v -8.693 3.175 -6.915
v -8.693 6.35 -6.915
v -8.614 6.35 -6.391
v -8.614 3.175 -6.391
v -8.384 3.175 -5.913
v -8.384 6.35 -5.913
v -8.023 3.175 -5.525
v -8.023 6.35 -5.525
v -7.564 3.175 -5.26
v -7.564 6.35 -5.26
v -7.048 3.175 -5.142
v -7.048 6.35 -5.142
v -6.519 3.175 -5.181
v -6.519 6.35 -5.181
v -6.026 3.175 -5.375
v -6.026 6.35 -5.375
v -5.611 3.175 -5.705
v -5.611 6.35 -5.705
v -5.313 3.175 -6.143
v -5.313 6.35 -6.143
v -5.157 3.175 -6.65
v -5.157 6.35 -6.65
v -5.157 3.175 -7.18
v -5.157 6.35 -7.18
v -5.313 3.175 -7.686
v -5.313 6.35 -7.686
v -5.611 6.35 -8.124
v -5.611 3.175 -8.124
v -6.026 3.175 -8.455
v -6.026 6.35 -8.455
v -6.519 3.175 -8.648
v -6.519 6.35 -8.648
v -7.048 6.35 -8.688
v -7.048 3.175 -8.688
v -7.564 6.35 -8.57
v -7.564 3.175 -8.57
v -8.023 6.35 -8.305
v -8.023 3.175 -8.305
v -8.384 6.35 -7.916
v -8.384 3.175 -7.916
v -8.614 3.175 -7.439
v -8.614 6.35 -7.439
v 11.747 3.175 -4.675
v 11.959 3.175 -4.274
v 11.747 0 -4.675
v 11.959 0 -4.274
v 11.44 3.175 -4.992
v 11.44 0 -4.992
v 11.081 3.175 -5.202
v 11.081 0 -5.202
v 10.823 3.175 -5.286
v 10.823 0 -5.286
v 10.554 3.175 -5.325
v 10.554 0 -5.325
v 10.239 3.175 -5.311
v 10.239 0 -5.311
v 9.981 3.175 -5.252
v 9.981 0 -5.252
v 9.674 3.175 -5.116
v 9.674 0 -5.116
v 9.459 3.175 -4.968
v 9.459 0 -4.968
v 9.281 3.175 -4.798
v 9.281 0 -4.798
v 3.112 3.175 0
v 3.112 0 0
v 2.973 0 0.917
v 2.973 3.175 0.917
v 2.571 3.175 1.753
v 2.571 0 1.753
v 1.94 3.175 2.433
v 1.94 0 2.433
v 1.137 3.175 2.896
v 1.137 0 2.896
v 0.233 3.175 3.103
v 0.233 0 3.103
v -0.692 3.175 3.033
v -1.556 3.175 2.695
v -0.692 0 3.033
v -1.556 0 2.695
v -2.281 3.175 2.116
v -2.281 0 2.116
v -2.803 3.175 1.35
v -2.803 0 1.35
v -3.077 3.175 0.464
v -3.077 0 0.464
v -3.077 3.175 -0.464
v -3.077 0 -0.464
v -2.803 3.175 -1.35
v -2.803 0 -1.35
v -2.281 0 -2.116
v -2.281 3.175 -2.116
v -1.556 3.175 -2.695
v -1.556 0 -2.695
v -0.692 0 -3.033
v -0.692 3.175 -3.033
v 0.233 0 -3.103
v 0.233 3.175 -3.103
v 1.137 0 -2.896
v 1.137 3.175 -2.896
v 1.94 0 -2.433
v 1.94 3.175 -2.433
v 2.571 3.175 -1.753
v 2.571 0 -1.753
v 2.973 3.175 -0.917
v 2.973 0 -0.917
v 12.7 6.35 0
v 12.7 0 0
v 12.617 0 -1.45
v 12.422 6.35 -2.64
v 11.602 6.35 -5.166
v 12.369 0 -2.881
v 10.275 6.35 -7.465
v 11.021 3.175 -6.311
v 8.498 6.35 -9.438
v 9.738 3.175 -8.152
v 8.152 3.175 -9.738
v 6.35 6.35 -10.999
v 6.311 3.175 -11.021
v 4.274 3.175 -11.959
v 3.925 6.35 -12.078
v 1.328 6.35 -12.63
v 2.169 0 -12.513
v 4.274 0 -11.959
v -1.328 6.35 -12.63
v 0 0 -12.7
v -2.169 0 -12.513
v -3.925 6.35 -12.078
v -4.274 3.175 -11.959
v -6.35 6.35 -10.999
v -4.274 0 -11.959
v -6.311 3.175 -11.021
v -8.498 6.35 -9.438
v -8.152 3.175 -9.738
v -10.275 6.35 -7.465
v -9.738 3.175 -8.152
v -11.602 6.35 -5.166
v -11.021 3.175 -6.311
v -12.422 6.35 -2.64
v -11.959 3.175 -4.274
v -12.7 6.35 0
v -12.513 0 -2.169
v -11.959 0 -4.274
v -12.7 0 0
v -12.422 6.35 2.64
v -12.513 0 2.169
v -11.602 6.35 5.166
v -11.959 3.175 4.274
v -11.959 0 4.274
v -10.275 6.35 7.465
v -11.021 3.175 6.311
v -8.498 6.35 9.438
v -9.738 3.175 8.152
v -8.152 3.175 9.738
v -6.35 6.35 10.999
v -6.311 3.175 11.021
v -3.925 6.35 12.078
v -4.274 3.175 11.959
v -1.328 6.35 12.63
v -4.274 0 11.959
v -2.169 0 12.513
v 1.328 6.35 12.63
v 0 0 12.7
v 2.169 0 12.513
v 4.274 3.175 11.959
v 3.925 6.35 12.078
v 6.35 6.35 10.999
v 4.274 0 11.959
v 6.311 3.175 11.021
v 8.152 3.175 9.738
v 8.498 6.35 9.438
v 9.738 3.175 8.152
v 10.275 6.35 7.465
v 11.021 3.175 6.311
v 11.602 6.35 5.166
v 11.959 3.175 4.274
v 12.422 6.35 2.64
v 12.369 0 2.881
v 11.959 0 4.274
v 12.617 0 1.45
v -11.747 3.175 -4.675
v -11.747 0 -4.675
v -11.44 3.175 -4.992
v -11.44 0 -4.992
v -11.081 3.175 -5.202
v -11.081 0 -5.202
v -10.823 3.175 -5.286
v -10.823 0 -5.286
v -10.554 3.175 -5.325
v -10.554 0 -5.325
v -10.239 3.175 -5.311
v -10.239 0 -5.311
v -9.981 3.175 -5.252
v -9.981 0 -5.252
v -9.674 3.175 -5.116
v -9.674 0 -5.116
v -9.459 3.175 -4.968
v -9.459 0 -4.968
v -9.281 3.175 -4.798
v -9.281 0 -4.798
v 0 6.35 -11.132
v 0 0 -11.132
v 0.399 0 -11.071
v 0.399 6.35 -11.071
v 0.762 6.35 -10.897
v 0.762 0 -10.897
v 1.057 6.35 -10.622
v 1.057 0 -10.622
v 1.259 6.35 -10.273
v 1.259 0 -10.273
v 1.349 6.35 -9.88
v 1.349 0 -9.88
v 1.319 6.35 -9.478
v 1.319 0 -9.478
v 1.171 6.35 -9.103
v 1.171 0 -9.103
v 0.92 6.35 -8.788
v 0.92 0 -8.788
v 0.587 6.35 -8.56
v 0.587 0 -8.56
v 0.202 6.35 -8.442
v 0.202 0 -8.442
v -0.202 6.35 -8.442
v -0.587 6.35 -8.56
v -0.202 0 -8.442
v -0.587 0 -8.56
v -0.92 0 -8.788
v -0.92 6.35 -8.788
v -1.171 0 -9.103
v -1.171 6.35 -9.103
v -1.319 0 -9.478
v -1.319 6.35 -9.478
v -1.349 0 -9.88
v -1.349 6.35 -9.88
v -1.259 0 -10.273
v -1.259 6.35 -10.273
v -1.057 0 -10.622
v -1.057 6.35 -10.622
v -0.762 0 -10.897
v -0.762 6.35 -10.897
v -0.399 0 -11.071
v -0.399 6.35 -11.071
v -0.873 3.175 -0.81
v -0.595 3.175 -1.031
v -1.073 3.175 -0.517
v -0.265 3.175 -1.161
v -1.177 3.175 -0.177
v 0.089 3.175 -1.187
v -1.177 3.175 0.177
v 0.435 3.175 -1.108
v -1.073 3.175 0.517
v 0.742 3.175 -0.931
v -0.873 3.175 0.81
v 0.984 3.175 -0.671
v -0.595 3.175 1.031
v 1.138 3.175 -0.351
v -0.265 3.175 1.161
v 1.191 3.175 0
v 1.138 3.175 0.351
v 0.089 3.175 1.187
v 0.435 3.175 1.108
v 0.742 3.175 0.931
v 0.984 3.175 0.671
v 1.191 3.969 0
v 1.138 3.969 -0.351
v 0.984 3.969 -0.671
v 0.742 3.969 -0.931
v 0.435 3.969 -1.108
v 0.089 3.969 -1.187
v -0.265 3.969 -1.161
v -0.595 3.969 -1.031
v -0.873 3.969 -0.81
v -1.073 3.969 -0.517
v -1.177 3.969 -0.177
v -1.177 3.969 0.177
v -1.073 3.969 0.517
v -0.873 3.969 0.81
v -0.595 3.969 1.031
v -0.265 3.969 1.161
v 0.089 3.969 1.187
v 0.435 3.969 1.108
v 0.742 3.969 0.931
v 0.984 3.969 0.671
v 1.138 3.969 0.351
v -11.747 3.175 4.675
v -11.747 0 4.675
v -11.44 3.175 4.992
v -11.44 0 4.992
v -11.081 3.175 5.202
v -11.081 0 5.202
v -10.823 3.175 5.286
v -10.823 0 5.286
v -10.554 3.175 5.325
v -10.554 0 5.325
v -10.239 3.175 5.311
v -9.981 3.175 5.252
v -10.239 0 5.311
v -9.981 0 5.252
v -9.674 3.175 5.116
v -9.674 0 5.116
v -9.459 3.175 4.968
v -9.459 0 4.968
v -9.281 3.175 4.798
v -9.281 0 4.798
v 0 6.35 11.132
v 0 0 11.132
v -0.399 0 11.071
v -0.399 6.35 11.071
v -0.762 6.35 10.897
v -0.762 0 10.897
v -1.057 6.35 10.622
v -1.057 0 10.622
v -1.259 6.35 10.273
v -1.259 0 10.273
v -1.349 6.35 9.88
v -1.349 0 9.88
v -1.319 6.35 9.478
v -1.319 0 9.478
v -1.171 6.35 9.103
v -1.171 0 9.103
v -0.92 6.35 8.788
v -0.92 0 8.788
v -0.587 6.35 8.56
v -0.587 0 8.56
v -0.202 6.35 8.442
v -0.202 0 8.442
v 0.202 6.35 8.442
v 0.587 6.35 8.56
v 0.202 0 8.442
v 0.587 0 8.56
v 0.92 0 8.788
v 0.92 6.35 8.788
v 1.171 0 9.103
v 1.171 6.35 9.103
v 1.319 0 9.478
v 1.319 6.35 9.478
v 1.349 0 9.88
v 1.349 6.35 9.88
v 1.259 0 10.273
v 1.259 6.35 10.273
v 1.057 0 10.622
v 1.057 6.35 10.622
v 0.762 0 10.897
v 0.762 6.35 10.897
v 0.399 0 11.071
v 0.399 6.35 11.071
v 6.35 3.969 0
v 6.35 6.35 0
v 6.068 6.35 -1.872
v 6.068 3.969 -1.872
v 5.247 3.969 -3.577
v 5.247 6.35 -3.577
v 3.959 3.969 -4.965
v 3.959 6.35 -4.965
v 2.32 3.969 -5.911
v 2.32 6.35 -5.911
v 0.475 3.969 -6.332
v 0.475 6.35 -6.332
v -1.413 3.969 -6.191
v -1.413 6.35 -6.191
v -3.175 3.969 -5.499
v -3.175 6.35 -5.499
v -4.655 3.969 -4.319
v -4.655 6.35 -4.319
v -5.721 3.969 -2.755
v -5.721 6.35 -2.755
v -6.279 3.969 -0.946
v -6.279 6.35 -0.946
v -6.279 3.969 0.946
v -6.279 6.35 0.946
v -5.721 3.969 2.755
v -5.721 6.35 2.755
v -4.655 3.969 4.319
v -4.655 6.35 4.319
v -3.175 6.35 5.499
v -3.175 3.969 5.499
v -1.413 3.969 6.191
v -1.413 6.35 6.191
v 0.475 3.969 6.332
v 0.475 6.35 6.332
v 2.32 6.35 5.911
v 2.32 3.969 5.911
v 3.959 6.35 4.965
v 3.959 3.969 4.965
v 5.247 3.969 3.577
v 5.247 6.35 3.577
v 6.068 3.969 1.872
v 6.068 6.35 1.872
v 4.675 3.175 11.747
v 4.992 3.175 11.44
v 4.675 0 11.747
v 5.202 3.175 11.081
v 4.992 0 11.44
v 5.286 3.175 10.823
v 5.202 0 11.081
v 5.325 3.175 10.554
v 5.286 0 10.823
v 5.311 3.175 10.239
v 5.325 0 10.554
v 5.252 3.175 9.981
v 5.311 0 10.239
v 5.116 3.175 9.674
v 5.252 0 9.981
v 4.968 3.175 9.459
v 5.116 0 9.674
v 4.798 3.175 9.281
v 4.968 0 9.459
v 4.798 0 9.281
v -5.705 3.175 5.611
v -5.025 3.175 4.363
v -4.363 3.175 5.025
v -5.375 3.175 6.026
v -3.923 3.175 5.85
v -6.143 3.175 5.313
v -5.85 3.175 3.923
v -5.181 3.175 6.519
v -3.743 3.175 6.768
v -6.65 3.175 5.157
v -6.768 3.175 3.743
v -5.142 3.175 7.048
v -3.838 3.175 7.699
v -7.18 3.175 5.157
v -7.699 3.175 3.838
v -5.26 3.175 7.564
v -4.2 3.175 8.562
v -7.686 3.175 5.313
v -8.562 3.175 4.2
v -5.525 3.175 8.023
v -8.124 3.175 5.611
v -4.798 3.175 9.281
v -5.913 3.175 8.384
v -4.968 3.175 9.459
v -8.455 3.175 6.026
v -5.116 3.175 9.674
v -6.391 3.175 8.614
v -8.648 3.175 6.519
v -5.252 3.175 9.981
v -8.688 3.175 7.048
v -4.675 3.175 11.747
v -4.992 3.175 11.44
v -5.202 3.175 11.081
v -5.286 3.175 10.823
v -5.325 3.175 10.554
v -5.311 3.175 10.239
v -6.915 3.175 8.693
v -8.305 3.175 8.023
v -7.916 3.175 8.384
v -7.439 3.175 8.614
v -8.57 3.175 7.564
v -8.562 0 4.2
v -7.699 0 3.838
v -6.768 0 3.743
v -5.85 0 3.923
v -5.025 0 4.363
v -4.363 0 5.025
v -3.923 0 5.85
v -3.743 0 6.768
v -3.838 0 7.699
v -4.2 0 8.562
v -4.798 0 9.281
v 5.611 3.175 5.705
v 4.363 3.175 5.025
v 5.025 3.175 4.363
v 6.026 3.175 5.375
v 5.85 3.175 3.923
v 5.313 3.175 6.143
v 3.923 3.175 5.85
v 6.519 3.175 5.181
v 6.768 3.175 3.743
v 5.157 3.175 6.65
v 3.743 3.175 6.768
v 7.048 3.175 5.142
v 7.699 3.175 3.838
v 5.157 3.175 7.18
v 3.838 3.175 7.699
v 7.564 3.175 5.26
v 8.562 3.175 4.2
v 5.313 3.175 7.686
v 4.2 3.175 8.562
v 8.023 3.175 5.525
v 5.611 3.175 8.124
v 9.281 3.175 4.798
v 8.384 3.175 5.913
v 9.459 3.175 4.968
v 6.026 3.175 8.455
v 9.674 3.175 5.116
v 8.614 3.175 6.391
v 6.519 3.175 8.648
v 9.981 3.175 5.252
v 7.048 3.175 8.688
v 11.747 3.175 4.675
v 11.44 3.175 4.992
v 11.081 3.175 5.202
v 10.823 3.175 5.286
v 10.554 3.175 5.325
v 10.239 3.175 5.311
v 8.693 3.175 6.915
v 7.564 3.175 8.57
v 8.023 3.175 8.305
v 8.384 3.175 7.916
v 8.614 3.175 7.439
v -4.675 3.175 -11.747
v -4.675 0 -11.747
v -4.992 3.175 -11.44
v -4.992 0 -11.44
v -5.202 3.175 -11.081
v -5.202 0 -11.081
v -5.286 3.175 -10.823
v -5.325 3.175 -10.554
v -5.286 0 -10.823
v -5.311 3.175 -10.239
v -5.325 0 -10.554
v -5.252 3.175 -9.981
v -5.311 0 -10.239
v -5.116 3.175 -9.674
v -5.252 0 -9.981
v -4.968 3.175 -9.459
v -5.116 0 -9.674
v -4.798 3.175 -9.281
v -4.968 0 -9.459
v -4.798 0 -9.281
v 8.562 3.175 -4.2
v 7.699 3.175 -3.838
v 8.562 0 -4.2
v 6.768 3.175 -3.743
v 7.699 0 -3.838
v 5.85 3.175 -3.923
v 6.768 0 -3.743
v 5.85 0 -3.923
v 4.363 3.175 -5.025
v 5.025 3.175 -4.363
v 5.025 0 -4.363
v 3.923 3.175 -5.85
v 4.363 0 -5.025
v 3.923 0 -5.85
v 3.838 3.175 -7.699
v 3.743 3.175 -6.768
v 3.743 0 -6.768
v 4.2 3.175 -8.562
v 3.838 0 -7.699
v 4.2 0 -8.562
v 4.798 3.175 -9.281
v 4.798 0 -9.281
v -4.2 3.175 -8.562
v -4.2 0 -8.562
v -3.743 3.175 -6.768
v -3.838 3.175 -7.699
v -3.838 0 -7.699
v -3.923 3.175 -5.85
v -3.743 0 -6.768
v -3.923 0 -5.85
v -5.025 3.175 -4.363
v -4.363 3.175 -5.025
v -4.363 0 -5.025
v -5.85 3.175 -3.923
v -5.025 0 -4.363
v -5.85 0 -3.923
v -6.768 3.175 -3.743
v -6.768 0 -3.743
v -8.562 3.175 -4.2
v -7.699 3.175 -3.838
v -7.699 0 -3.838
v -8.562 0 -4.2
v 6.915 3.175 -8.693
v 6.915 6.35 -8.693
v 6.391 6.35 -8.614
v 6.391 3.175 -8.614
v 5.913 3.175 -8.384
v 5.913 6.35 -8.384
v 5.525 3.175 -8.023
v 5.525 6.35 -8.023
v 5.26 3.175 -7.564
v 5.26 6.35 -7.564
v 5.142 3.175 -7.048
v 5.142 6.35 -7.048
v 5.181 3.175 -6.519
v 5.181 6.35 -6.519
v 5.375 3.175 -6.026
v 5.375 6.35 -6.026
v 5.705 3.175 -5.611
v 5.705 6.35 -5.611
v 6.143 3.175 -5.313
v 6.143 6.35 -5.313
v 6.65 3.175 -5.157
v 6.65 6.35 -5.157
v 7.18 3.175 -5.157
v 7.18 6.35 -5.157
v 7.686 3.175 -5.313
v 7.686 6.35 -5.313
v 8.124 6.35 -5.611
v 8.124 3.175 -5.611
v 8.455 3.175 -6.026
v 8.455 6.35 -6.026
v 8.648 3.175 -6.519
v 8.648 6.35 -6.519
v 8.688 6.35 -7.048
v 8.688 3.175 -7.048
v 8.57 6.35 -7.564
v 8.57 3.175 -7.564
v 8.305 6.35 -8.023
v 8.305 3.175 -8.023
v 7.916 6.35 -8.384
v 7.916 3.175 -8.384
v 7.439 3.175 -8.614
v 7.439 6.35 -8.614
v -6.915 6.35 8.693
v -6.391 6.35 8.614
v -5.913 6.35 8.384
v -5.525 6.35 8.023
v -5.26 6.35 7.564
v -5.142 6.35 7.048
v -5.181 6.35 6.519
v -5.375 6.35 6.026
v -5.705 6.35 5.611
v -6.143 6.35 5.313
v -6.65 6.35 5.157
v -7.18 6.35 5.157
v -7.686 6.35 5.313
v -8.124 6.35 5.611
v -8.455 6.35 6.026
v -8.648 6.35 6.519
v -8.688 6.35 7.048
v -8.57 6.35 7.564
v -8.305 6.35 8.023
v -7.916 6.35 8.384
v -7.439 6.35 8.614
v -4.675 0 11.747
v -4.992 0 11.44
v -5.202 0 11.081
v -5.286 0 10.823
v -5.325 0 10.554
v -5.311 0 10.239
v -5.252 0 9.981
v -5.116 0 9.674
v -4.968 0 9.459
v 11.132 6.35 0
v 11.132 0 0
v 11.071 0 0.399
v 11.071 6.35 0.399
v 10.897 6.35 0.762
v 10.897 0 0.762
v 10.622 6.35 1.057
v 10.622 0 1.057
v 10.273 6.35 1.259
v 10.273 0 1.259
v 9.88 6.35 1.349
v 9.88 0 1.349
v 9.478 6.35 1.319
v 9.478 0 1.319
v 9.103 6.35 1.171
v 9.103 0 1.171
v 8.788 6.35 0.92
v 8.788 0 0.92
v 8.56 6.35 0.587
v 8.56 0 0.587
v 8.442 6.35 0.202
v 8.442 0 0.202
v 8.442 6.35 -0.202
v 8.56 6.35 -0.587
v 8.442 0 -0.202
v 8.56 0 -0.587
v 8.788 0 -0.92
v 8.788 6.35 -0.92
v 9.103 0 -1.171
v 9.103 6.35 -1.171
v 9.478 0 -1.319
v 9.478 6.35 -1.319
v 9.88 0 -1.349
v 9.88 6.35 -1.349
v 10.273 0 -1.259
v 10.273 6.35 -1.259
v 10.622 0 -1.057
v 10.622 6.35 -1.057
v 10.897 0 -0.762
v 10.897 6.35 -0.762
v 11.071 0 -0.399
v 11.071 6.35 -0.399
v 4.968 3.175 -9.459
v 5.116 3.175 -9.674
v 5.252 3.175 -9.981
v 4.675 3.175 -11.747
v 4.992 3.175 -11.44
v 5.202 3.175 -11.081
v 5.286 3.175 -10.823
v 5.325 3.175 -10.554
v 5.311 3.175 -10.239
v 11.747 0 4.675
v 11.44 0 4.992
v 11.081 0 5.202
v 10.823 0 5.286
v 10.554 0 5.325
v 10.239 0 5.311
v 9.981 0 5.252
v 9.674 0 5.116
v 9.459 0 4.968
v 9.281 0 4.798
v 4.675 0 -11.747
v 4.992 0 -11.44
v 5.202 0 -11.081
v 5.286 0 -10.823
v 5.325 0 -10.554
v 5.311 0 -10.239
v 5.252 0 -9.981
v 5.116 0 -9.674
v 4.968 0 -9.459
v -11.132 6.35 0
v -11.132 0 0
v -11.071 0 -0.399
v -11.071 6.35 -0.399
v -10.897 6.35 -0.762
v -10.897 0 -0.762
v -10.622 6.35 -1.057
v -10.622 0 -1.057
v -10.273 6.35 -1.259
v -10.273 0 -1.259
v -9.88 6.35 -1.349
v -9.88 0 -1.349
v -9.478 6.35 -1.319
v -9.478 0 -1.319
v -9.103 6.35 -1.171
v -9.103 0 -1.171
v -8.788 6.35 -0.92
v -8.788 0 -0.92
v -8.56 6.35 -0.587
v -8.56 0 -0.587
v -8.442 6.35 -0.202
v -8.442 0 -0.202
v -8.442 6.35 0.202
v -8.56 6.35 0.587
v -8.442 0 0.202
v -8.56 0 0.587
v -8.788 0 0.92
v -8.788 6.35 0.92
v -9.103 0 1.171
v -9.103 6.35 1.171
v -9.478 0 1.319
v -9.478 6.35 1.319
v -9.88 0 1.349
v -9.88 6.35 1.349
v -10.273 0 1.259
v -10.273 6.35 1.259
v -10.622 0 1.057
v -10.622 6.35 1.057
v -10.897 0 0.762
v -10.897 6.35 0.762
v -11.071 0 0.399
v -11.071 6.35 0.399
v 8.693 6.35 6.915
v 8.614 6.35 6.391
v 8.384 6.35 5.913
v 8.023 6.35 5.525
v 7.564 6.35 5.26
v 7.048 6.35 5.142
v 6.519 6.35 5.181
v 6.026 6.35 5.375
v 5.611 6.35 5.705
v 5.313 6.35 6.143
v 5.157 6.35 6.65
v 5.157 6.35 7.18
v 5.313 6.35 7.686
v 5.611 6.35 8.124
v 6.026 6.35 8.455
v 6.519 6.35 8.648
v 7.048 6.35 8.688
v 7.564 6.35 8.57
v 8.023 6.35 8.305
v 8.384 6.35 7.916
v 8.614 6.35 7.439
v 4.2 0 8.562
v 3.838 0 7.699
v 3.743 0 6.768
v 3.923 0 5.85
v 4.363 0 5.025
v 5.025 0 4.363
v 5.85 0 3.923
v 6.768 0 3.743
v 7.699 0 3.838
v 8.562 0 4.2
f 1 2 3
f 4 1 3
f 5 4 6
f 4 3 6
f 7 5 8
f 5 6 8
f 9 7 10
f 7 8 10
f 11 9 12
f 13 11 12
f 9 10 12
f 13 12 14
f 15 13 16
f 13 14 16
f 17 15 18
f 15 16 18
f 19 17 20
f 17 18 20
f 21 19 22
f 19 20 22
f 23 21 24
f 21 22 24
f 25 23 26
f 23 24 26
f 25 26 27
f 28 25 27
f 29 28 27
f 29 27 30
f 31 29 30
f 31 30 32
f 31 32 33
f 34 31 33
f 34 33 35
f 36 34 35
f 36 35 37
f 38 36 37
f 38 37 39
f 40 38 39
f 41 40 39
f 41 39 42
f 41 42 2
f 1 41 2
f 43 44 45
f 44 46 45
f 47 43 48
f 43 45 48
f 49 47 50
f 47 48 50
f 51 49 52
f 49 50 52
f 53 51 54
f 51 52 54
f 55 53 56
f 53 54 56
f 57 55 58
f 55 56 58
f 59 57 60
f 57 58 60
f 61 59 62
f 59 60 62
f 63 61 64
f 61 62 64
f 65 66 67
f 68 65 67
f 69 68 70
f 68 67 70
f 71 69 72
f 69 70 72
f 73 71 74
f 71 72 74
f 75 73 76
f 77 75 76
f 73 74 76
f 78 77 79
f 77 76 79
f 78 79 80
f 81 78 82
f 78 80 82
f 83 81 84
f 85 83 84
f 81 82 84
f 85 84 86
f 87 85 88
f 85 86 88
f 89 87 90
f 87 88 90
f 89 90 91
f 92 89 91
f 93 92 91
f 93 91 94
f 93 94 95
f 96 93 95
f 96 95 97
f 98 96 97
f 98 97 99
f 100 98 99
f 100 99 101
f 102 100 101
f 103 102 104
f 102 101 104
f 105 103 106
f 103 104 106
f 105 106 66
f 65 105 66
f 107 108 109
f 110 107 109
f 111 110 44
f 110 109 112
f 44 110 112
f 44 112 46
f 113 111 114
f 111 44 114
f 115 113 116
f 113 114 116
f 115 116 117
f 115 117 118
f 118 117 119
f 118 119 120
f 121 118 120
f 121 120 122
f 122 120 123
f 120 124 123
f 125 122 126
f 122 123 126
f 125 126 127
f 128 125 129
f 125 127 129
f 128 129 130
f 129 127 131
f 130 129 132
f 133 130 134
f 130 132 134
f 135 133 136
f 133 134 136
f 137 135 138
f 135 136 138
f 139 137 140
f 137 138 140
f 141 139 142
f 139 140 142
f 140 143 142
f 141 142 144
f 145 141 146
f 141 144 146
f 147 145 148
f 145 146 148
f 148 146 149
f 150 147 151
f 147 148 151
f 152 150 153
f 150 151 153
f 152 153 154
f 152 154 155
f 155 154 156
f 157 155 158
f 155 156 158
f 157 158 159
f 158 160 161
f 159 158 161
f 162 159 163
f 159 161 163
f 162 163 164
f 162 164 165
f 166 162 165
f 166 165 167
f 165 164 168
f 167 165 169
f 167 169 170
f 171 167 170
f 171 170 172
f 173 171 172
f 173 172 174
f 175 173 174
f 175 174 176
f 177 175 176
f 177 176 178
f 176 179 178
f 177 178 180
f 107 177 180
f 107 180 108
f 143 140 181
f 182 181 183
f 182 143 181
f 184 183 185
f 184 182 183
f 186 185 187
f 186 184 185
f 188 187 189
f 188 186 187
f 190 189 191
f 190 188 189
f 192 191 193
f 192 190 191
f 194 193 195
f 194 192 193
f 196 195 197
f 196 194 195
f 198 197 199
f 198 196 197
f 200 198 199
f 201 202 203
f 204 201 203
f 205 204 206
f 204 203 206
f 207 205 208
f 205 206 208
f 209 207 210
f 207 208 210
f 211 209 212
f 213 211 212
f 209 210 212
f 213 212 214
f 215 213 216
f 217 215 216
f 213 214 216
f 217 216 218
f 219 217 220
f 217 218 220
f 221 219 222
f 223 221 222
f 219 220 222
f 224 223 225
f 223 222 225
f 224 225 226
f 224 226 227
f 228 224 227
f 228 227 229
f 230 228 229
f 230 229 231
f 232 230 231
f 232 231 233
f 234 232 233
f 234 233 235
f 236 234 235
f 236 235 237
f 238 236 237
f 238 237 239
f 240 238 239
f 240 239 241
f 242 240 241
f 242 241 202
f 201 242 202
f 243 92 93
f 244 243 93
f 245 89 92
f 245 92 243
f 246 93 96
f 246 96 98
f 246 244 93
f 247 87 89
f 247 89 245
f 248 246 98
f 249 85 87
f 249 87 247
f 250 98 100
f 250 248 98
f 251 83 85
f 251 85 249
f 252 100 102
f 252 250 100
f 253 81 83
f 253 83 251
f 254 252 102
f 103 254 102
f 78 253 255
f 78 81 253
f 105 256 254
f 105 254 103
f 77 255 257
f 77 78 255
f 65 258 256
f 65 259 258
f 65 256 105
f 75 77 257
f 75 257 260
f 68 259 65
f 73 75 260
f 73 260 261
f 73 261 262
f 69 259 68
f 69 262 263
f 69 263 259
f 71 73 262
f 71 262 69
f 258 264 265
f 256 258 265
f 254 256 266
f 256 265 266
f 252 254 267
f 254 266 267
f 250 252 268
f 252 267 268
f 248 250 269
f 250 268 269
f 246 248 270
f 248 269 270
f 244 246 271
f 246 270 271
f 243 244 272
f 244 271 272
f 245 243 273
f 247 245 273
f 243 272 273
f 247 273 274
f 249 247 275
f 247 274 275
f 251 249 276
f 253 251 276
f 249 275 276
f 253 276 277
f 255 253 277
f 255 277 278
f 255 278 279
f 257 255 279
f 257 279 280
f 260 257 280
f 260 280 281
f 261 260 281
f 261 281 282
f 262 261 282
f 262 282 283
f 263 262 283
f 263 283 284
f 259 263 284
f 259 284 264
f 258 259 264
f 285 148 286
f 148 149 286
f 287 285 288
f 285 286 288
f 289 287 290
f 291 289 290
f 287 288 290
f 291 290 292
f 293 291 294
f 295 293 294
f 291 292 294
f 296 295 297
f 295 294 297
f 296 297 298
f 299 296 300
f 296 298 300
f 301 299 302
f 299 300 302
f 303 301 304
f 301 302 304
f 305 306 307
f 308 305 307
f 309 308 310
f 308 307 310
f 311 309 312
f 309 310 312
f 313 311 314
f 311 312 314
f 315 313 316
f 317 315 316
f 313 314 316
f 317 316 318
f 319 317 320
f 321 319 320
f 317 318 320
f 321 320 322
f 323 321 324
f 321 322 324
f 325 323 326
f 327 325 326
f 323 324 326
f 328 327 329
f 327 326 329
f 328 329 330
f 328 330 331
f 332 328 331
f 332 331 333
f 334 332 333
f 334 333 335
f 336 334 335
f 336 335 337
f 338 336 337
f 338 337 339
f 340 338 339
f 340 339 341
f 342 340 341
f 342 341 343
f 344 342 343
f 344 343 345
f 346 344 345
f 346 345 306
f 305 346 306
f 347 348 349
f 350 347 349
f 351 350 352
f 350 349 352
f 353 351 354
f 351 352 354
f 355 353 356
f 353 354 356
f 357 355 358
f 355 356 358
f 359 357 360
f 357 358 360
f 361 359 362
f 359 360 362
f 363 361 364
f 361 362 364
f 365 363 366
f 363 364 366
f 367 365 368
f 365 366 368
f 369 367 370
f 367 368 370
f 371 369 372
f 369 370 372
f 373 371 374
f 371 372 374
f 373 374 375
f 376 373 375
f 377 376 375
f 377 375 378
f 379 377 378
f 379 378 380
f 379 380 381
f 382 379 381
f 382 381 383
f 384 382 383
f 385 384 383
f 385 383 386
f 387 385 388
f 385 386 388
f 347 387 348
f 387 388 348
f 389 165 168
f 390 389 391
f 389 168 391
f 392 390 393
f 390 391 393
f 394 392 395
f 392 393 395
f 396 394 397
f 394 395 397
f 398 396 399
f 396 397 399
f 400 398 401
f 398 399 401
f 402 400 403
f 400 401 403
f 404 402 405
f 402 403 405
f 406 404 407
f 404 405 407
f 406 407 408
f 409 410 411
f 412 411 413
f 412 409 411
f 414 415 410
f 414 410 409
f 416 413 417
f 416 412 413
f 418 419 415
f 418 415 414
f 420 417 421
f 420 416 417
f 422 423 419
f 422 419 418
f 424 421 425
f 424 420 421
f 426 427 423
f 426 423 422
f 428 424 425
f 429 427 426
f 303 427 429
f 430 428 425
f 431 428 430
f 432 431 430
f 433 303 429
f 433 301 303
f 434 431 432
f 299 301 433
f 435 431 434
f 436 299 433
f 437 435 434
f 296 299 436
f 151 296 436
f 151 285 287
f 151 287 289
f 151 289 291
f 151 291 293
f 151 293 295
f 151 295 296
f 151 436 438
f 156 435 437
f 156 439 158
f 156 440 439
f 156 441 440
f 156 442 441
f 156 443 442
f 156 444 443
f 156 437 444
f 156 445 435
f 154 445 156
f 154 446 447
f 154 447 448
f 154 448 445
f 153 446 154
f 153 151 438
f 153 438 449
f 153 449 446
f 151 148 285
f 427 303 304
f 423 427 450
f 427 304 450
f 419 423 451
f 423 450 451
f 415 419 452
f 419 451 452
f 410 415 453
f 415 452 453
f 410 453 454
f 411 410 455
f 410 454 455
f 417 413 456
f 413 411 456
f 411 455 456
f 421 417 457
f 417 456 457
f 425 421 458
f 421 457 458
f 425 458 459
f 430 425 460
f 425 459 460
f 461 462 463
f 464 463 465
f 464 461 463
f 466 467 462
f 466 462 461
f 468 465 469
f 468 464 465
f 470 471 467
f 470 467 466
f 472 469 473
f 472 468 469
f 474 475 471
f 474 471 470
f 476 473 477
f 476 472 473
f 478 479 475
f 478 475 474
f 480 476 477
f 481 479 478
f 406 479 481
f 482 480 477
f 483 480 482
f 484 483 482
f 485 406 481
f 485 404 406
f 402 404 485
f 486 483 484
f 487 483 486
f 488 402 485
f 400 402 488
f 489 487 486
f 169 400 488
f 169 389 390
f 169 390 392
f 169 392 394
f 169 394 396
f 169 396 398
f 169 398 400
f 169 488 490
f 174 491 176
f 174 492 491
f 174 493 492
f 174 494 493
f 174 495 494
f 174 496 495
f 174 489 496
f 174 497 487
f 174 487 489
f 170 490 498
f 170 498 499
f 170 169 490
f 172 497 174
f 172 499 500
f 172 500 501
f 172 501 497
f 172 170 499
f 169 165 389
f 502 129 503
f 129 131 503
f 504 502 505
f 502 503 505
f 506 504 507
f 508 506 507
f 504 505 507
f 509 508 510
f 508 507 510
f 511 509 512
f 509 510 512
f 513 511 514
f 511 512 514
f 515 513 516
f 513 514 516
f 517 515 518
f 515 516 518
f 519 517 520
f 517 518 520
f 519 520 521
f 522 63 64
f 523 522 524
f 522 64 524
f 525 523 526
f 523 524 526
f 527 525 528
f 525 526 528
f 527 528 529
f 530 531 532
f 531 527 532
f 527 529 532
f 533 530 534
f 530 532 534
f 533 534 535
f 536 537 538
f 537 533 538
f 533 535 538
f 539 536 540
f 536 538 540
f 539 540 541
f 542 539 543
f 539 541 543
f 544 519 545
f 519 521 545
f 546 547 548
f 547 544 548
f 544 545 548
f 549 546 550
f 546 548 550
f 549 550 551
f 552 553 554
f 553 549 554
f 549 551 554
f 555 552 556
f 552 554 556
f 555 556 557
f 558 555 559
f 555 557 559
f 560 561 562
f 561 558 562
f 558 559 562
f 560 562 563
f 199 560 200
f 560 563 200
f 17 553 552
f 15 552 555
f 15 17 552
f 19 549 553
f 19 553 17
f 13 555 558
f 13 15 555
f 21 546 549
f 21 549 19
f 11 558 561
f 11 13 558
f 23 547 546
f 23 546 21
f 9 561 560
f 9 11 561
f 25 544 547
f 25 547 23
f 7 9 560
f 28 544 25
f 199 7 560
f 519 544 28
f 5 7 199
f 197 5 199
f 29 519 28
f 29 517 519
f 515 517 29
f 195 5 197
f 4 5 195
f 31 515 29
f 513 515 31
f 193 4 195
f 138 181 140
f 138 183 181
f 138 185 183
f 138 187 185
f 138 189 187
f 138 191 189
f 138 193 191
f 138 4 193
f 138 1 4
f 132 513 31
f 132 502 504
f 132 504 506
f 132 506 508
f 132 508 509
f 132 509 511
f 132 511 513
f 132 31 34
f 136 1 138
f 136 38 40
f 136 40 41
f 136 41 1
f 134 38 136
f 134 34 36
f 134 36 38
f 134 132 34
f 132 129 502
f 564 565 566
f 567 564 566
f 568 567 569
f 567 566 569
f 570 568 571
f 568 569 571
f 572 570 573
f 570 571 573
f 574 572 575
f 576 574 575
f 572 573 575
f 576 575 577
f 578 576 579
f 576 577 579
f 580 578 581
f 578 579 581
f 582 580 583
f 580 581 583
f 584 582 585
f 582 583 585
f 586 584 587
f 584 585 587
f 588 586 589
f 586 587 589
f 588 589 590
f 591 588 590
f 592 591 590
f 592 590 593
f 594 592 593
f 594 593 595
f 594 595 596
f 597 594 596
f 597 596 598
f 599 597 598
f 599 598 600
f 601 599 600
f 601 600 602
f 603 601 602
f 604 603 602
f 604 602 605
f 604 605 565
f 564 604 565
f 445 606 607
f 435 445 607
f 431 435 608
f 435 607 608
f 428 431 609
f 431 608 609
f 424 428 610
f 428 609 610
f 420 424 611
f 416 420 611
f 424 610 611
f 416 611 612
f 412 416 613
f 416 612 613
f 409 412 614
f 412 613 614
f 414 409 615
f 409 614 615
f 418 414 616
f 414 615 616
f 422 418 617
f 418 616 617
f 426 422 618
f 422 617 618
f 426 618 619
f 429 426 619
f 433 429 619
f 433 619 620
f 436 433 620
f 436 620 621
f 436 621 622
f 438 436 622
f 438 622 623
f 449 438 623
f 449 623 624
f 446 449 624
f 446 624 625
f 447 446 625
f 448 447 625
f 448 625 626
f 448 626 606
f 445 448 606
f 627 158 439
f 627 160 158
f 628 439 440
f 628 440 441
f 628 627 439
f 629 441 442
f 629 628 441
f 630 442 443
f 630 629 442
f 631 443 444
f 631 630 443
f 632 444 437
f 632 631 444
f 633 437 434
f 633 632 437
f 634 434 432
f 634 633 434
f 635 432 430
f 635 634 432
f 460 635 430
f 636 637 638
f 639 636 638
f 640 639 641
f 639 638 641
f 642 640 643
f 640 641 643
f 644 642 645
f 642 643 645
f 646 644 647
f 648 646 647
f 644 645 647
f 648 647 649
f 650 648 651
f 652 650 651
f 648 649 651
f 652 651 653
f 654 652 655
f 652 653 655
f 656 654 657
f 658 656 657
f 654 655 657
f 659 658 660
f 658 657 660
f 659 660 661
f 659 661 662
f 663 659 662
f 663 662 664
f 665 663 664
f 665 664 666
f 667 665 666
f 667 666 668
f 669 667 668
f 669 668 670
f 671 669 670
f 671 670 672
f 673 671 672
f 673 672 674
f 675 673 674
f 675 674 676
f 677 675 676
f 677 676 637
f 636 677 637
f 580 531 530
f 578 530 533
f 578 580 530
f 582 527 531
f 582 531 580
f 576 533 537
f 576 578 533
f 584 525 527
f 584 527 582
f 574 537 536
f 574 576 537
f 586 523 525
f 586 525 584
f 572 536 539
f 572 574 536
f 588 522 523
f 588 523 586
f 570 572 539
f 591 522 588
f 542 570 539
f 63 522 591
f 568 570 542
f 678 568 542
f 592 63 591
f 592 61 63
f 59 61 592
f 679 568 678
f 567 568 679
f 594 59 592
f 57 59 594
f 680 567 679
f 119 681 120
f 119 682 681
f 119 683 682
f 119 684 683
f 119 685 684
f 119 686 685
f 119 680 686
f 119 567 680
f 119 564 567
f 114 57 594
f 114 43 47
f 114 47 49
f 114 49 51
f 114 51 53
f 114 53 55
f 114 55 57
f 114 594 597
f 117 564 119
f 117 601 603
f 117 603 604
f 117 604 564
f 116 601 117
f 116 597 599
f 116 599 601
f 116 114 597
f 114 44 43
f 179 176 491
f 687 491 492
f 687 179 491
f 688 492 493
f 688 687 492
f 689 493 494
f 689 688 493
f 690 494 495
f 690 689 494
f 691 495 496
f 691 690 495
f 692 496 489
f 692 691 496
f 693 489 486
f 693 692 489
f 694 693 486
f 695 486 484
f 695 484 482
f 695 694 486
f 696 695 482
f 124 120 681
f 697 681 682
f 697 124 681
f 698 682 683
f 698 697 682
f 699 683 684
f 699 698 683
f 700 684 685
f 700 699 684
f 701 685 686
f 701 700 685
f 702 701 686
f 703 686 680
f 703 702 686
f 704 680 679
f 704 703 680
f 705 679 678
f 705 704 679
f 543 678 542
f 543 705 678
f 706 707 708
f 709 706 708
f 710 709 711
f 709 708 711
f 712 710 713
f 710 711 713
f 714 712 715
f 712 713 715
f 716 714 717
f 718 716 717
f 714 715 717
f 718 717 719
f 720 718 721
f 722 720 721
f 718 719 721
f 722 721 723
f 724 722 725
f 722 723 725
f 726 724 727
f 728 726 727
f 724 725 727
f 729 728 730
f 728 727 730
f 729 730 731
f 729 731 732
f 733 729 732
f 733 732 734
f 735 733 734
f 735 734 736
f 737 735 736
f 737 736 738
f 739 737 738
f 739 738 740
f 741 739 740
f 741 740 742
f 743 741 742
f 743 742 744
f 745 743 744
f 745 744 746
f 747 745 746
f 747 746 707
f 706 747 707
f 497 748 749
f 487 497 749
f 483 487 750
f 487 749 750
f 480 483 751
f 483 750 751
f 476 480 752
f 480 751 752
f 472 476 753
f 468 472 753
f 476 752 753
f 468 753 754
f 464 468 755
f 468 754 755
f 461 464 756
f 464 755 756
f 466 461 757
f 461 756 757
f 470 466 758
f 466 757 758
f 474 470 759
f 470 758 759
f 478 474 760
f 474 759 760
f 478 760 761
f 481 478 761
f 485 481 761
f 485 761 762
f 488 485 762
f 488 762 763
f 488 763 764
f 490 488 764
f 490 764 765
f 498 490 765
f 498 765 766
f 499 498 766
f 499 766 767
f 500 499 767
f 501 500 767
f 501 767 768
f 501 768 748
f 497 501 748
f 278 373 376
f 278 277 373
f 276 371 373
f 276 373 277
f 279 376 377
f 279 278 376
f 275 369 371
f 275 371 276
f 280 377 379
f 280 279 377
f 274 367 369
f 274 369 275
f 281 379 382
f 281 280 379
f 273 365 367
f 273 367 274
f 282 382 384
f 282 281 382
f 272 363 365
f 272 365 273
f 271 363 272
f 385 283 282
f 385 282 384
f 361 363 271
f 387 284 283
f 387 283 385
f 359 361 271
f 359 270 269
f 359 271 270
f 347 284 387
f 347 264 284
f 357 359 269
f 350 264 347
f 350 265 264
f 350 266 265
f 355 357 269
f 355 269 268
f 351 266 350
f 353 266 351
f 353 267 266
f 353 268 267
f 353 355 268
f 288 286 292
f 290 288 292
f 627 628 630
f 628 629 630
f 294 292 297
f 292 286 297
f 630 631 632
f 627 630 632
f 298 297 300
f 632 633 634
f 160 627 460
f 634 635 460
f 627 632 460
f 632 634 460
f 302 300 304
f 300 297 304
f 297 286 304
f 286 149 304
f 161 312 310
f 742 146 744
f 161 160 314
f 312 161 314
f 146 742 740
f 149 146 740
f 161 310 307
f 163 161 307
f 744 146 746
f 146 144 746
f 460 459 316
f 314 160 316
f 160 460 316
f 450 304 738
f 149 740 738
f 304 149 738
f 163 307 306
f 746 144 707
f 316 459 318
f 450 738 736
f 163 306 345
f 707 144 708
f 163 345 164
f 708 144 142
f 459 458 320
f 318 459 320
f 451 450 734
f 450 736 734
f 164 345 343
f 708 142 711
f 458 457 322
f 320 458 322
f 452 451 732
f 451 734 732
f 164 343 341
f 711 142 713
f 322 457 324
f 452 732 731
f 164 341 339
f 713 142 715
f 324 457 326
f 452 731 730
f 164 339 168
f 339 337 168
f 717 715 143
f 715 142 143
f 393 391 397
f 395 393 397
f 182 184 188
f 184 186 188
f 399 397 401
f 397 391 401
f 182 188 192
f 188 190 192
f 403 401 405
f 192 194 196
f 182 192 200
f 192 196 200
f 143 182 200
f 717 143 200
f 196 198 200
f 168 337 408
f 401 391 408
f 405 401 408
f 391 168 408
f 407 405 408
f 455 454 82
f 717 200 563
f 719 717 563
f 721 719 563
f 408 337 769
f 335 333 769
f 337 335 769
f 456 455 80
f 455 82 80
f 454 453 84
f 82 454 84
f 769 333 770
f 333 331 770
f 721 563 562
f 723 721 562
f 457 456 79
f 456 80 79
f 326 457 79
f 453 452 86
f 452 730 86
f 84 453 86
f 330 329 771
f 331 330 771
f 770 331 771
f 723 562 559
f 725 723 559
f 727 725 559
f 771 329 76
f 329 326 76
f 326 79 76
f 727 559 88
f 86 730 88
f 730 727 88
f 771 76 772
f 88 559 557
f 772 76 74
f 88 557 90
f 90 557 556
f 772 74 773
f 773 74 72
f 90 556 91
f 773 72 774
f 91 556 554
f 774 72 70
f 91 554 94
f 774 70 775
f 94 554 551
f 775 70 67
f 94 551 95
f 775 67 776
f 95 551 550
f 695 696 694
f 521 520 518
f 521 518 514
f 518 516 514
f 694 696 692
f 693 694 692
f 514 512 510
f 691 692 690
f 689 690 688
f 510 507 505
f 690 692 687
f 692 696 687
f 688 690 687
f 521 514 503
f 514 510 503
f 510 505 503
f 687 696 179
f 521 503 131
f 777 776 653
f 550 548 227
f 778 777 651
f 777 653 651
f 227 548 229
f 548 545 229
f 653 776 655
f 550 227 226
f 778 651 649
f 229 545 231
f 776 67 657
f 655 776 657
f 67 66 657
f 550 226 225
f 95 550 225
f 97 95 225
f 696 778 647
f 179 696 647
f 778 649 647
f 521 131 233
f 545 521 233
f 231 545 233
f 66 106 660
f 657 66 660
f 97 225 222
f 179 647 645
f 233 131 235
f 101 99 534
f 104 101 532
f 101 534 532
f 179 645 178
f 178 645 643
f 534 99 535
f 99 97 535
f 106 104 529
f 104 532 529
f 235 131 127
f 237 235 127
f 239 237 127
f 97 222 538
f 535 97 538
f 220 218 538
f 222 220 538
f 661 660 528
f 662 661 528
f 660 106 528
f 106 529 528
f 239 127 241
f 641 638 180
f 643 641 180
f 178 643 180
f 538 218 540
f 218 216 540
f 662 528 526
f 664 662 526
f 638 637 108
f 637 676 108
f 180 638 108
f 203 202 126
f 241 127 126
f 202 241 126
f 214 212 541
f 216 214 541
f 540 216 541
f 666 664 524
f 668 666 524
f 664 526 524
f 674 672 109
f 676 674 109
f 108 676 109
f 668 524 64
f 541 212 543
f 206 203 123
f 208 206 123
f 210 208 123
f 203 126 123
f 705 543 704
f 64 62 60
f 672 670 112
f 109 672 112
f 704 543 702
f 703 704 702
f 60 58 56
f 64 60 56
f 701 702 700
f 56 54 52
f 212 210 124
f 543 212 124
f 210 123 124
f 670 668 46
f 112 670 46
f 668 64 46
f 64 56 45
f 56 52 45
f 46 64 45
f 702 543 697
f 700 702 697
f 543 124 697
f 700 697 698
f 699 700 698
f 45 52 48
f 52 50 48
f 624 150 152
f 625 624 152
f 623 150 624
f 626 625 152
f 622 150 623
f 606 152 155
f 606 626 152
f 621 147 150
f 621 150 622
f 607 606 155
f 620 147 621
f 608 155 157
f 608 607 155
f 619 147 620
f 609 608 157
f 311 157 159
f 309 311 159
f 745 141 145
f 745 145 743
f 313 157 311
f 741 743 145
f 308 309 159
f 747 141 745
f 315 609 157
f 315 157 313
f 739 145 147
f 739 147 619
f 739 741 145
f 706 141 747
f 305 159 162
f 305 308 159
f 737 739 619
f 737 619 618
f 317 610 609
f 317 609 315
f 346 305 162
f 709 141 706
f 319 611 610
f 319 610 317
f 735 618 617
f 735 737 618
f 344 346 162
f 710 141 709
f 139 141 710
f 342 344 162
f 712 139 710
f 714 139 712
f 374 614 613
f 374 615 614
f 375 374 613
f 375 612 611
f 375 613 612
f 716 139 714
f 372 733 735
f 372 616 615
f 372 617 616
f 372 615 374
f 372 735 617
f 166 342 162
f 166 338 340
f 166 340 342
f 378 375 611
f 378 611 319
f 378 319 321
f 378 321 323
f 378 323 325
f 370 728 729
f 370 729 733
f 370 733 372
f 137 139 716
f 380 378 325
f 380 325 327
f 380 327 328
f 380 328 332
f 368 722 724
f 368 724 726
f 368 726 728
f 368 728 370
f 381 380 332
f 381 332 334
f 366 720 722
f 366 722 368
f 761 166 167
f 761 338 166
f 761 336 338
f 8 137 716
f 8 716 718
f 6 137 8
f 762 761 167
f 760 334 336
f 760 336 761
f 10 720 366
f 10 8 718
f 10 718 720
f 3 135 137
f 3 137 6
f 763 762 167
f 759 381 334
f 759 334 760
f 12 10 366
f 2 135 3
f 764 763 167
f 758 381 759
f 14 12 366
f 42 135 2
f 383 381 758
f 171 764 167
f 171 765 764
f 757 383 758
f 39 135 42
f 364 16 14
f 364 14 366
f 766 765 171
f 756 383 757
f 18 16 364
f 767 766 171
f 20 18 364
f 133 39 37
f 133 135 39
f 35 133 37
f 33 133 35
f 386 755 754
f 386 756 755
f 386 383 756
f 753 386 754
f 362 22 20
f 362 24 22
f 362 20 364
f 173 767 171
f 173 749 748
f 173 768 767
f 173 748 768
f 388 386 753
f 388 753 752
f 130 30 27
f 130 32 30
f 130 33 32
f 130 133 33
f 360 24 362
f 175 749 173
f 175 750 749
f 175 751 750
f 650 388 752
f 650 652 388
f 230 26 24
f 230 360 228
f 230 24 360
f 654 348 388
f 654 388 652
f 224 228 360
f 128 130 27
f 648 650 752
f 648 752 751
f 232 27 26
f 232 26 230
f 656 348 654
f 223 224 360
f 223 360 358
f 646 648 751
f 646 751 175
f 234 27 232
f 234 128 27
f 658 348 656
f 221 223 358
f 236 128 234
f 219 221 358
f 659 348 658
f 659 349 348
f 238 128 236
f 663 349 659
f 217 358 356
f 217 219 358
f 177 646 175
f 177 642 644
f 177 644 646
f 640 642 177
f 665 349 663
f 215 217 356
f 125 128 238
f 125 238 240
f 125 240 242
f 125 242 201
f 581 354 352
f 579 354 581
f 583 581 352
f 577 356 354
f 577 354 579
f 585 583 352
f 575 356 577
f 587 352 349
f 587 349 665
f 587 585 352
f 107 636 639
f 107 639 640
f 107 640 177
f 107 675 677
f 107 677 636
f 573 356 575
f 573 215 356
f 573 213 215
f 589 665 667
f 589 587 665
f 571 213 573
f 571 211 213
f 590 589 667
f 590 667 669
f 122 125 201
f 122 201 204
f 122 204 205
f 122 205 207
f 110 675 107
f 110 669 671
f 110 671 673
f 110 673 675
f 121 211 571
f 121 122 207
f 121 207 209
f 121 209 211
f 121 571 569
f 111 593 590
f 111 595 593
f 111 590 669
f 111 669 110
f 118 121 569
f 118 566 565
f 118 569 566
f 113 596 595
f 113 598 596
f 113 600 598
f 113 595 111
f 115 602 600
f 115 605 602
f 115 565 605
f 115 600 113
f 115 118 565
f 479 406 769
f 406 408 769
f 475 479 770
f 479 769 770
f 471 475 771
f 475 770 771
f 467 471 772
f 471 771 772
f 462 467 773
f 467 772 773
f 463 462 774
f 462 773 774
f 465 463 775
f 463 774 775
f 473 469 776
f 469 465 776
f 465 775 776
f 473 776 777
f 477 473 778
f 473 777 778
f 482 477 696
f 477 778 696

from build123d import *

# Parameters (mm, degrees)
SKETCH1_R             = 12.7
BOSS_EXTRUDE1_DEPTH   = 6.35
SKETCH2_R             = 6.35
CUT_EXTRUDE1_DEPTH    = 2.38125
SKETCH3_R             = 3.1115
CUT_EXTRUDE2_DEPTH    = 3.175
SKETCH4_R             = 1.190625
CUT_EXTRUDE3_DEPTH    = 4.96875
F_6_32_TAPPED_HOLE1_D = 2.7051
SKETCH7_R             = 1.778
CUT_EXTRUDE4_DEPTH    = 7.35
SKETCH8_R             = 3.175
CUT_EXTRUDE5_DEPTH    = 3.175
CIRPATTERN2_COUNT     = 4
FILLET1_R             = 1.5875


with BuildPart() as part:
    # Sketch1 → Boss-Extrude1 (new body)
    with BuildSketch(Plane(origin=(0, 0, 0), x_dir=(1, 0, 0), z_dir=(0, 1, 0))):
        Circle(SKETCH1_R)
    extrude(amount=BOSS_EXTRUDE1_DEPTH)

    # Sketch2 → Cut-Extrude1 (cut)
    with BuildSketch(Plane(origin=(0, 6.35, 0), x_dir=(1, 0, 0), z_dir=(0, 1, 0))):
        Circle(SKETCH2_R)
    extrude(amount=-CUT_EXTRUDE1_DEPTH, mode=Mode.SUBTRACT)

    # Sketch3 → Cut-Extrude2 (cut)
    with BuildSketch(Plane.XZ):
        Circle(SKETCH3_R)
    extrude(amount=-CUT_EXTRUDE2_DEPTH, mode=Mode.SUBTRACT)

    # Sketch4 → Cut-Extrude3 (cut, through all)
    with BuildSketch(Plane(origin=(0, 3.96875, 0), x_dir=(1, 0, 0), z_dir=(0, 1, 0))):
        Circle(SKETCH4_R)
    extrude(amount=-CUT_EXTRUDE3_DEPTH, mode=Mode.SUBTRACT)

    # #6-32 Tapped Hole1 (through all)
    with Locations(Plane(origin=(0, 6.35, 0), x_dir=(1, 0, 0), z_dir=(0, 1, 0))):
        with Locations((-9.779, 0)):
            f_6_32_tapped_hole1 = Hole(F_6_32_TAPPED_HOLE1_D / 2)

    # Sketch7 → Cut-Extrude4 (cut, through all)
    with BuildSketch(Plane(origin=(0, 6.35, 0), x_dir=(1, 0, 0), z_dir=(0, 1, 0))):
        with Locations((6.914797213, -6.914797213)):
            Circle(SKETCH7_R)
    cut_extrude4 = extrude(amount=-CUT_EXTRUDE4_DEPTH, mode=Mode.SUBTRACT)

    # Sketch8 → Cut-Extrude5 (cut)
    with BuildSketch(Plane.XZ):
        with Locations((6.914797213, 6.914797213)):
            Circle(SKETCH8_R)
    cut_extrude5 = extrude(amount=-CUT_EXTRUDE5_DEPTH, mode=Mode.SUBTRACT)

    # CirPattern2: #6-32 Tapped Hole1, Cut-Extrude4, Cut-Extrude5 ×4 about axis
    cirpattern2_axis = Axis((0, 0, 0), (0, 1, 0))
    for i in range(1, CIRPATTERN2_COUNT):
        add(f_6_32_tapped_hole1.rotate(cirpattern2_axis, i * 360 / CIRPATTERN2_COUNT), mode=Mode.SUBTRACT)
        add(cut_extrude4.rotate(cirpattern2_axis, i * 360 / CIRPATTERN2_COUNT), mode=Mode.SUBTRACT)
        add(cut_extrude5.rotate(cirpattern2_axis, i * 360 / CIRPATTERN2_COUNT), mode=Mode.SUBTRACT)

    # Fillet1
    fillet1_edges = [part.edges().sort_by_distance(p)[0] for p in [
        (7.923120818, 1.5875, 9.925429789),
        (9.925429789, 1.5875, 7.923120818),
        (9.925429789, 1.5875, -7.923120818),
        (7.923120818, 1.5875, -9.925429789),
        (-7.923120818, 1.5875, -9.925429789),
        (-9.925429789, 1.5875, -7.923120818),
        (-9.925429789, 1.5875, 7.923120818),
        (-7.923120818, 1.5875, 9.925429789),
    ]]
    fillet(fillet1_edges, radius=FILLET1_R)


solid = part.part
